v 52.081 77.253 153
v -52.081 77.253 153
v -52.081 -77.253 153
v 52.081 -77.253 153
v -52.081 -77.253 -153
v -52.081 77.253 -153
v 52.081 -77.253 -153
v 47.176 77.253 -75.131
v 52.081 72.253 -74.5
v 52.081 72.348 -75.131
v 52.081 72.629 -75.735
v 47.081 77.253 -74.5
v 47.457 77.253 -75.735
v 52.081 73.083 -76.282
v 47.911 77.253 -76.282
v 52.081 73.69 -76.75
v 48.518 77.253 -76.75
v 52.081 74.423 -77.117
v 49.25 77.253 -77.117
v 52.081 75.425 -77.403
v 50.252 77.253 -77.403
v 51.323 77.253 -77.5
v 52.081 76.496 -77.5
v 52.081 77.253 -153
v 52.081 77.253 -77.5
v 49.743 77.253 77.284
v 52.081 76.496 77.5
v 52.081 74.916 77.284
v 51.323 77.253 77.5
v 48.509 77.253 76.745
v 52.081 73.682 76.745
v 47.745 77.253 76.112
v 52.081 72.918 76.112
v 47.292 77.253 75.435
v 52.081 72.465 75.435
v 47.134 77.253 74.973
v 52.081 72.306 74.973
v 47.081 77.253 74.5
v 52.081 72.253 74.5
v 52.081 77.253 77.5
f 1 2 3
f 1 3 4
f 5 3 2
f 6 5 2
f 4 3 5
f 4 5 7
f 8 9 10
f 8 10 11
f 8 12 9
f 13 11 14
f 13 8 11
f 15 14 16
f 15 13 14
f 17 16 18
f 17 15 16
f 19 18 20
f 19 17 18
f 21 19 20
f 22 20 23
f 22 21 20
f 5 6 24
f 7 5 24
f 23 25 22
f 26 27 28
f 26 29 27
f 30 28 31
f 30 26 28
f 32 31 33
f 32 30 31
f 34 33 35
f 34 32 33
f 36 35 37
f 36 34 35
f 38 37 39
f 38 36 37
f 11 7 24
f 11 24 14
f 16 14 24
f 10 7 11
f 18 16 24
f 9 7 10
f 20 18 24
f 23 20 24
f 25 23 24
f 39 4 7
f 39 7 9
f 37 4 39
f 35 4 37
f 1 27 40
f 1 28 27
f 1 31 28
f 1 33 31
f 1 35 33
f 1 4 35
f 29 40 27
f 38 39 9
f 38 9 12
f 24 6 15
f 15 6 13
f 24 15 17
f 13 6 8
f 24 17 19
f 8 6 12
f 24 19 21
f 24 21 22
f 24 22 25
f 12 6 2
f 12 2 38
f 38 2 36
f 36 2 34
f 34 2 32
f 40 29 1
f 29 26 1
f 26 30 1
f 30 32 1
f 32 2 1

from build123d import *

# Parameters (mm, degrees)
SKIZZE1_W                       = 104.161525742
SKIZZE1_H                       = 154.506635072
AUFSATZ_LINEAR_AUSTRAGEN1_DEPTH = 153
SCHNITT_LINEAR_AUSTRAGEN1_DEPTH = 77.5
VERRUNDUNG3_R                   = 3


with BuildPart() as part:
    # Skizze1 → Aufsatz-Linear austragen1 (new body, symmetric)
    with BuildSketch(Plane.XY):
        Rectangle(SKIZZE1_W, SKIZZE1_H)
    extrude(amount=AUFSATZ_LINEAR_AUSTRAGEN1_DEPTH, both=True)

    # Skizze2 → Schnitt-Linear austragen1 (cut, symmetric)
    with BuildSketch(Plane.XY):
        Polygon((47.080762871, 77.253317536), (52.080762871, 77.253317536), (52.080762871, 72.253317536), align=None)
    extrude(amount=SCHNITT_LINEAR_AUSTRAGEN1_DEPTH, both=True, mode=Mode.SUBTRACT)

    # Verrundung3
    verrundung3_edges = [part.edges().sort_by_distance(p)[0] for p in [
        (49.580762871, 74.753317536, -77.5),
        (49.580762871, 74.753317536, 77.5),
    ]]
    fillet(verrundung3_edges, radius=VERRUNDUNG3_R)


solid = part.part
